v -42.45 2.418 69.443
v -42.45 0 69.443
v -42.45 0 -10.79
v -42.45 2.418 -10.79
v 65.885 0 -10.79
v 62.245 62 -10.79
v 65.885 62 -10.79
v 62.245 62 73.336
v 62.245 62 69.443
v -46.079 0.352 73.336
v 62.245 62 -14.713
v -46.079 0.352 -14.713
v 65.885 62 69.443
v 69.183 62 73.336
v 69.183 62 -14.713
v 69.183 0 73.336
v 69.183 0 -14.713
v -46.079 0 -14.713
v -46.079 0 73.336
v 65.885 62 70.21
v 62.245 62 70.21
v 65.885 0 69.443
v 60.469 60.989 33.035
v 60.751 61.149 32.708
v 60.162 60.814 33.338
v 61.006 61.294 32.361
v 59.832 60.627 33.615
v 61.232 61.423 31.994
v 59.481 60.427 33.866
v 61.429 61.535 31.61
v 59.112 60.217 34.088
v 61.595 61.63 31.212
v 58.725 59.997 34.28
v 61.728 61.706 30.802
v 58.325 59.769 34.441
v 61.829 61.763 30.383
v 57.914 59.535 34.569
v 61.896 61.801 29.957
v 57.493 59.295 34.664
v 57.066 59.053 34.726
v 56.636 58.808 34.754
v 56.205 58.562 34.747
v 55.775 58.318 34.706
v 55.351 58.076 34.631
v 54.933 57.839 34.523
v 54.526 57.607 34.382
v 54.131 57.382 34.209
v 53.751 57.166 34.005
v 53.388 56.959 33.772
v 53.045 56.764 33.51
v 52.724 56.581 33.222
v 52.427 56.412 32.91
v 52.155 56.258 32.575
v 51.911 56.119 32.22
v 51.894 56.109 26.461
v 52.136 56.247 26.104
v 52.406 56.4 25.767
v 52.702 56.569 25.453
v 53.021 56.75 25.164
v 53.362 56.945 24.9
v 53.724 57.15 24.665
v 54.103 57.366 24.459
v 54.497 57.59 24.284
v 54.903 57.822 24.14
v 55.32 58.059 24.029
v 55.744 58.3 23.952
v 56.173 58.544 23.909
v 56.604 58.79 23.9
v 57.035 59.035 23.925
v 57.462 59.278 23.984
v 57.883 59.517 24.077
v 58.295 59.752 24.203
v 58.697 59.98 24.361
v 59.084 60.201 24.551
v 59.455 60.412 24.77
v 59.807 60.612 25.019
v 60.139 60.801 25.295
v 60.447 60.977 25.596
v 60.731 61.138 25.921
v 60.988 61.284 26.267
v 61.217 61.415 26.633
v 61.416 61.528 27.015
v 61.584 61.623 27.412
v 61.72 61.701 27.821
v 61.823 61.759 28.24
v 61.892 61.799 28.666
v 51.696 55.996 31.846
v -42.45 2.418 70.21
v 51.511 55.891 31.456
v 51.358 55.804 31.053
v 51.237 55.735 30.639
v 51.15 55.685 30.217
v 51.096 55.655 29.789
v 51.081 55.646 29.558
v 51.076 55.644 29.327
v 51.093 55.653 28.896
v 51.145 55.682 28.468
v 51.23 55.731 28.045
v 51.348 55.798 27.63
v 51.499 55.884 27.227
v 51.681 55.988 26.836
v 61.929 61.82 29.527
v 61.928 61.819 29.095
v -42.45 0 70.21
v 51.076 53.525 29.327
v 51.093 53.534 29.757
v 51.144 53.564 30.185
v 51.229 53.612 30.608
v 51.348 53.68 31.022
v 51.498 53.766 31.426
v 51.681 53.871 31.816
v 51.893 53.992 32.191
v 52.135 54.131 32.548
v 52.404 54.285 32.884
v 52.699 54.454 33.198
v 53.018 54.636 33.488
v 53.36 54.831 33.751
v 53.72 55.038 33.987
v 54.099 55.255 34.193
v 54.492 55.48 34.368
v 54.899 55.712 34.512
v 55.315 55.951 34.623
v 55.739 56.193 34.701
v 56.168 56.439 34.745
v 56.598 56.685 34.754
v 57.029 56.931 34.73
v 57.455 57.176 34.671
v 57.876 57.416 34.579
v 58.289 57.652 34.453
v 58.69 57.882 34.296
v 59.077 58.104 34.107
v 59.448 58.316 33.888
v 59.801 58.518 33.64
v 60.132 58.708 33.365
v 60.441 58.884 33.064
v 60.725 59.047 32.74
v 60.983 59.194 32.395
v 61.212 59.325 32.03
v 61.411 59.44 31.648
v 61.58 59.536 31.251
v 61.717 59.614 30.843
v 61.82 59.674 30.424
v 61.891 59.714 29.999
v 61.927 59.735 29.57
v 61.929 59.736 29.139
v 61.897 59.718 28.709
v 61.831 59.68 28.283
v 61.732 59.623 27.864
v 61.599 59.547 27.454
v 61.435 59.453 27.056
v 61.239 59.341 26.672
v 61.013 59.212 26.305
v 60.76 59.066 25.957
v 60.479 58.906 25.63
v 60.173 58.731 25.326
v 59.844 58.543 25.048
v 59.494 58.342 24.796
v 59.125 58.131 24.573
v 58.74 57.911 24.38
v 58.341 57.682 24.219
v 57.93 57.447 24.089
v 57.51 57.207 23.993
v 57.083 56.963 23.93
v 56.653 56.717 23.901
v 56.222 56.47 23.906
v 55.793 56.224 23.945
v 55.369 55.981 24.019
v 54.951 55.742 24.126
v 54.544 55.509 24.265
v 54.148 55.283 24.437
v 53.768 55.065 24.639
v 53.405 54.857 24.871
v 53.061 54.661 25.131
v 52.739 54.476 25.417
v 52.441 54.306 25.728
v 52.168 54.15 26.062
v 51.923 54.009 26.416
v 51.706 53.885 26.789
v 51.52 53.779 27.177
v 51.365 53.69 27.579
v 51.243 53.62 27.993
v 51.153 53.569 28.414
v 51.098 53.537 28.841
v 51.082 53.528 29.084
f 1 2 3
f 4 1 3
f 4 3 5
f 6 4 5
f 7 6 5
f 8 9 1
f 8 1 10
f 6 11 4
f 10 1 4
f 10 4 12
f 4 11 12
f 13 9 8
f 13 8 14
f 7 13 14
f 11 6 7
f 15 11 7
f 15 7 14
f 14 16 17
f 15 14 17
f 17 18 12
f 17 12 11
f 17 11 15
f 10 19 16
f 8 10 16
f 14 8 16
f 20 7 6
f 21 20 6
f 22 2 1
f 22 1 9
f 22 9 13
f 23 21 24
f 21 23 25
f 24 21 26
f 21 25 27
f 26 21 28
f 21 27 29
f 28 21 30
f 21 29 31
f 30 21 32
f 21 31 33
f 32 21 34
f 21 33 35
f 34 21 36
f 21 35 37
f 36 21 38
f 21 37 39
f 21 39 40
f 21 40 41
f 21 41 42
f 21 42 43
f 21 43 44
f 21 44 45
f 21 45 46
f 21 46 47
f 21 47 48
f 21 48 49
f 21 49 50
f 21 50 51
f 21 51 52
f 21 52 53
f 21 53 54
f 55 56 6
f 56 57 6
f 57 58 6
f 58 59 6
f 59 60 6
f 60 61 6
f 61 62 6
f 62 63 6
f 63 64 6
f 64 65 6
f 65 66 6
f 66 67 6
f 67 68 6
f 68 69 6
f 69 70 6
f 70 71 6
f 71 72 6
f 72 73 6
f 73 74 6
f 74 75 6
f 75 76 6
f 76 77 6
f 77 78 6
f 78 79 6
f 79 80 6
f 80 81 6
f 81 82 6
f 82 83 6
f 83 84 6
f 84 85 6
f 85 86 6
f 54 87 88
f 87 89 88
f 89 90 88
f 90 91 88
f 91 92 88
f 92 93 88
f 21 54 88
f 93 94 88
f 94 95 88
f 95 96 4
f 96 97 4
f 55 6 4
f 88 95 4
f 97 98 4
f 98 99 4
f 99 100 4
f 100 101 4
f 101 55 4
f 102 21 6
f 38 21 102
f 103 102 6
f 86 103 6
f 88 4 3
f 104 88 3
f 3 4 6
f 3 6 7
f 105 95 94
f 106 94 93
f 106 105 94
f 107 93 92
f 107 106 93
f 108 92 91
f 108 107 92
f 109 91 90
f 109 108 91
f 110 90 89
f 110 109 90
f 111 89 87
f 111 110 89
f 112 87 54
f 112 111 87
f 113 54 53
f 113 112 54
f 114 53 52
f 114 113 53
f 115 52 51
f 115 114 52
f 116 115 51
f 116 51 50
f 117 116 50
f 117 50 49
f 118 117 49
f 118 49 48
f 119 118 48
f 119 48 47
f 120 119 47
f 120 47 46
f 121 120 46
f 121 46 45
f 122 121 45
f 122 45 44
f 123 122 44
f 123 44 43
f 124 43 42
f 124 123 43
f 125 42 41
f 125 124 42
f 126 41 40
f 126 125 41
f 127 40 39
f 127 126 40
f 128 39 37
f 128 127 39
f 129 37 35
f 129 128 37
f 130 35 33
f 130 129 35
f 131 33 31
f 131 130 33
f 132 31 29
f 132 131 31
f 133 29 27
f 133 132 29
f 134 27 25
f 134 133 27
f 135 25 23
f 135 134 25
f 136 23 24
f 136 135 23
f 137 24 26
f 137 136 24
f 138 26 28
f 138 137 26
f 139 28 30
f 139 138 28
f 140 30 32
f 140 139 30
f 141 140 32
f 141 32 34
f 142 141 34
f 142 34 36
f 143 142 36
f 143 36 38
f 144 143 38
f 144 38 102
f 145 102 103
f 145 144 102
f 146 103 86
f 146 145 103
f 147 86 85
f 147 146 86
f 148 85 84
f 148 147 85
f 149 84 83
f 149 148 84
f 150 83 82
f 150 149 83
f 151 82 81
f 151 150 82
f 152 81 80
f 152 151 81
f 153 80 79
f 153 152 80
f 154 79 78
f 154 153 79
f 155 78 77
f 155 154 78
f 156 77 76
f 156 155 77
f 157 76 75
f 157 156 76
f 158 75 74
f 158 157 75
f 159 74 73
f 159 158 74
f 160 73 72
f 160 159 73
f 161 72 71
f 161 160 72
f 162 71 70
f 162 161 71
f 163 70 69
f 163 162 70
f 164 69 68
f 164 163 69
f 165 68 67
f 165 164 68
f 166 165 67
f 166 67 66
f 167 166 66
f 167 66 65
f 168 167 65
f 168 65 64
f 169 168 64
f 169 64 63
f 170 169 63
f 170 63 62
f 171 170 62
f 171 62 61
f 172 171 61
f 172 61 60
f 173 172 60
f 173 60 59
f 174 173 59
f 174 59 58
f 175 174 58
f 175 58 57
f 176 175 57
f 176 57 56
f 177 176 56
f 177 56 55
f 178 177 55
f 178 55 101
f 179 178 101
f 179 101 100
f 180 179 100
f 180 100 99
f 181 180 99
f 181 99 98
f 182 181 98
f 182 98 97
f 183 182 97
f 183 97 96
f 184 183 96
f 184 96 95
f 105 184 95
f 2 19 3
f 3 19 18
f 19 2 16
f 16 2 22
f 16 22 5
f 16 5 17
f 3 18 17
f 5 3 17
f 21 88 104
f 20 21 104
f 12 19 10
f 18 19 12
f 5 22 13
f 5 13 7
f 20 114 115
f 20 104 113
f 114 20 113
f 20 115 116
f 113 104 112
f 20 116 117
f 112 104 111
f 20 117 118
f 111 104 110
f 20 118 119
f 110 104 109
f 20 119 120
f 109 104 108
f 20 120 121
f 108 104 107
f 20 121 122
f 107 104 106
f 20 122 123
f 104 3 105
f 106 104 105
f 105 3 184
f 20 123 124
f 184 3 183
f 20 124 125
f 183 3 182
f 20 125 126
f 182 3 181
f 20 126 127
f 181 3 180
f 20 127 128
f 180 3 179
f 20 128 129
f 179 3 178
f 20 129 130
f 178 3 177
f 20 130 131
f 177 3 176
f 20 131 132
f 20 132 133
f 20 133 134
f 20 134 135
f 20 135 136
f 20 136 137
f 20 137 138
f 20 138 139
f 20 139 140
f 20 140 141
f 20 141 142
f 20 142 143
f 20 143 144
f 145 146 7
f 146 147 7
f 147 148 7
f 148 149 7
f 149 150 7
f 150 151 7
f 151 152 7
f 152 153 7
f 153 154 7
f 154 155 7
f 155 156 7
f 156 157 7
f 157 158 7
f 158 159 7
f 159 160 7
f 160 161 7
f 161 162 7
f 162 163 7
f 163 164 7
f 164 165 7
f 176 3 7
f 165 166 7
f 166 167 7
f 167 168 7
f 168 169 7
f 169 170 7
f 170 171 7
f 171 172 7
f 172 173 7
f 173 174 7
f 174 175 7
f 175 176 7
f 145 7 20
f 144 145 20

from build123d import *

# Parameters (mm, degrees)
SKETCH1_W               = 115.26232874
SKETCH1_H               = 88.049326178
SKETCH1_W_2             = 108.334990875
SKETCH1_H_2             = 80.232993298
BOSS_EXTRUDE1_DEPTH     = 62
BOSS_EXTRUDE5_DEPTH     = 81
CUT_EXTRUDE1_DEPTH      = 140
CUT_EXTRUDE1_DEPTH_BACK = 140
SKETCH4_R               = 5.428235827
CUT_EXTRUDE2_DEPTH      = 143


with BuildPart() as part:
    # Sketch1 → Boss-Extrude1 (new body)
    with BuildSketch(Plane(origin=(0, 0, 0), x_dir=(1, 0, 0), z_dir=(0, 1, 0))):
        with Locations((11.551784024, -29.311600955)):
            Rectangle(SKETCH1_W, SKETCH1_H)
        with Locations((11.717857977, -29.326880603)):
            Rectangle(SKETCH1_W_2, SKETCH1_H_2, mode=Mode.SUBTRACT)
    extrude(amount=BOSS_EXTRUDE1_DEPTH)

    # Sketch3 → Cut-Extrude1 (cut, two sides: drawn at the far end of the back side and taken through both)
    with BuildSketch(Plane.XY.offset(-10.789616046).offset(-CUT_EXTRUDE1_DEPTH_BACK)):
        Polygon((62.245399556, 62), (-47.988966562, -0.734479554), (-64.593447551, 83.162099854), (74.178741731, 71.645214526), align=None)
    extrude(amount=CUT_EXTRUDE1_DEPTH + CUT_EXTRUDE1_DEPTH_BACK, mode=Mode.SUBTRACT)


with BuildPart() as body_2:
    # Sketch2 → Boss-Extrude5 (new body)
    with BuildSketch(Plane.XY.offset(-10.789616046)):
        Polygon((-42.44963746, 0), (65.885353415, 62), (62.245399556, 62), (-42.44963746, 2.417957753), align=None)
    extrude(amount=BOSS_EXTRUDE5_DEPTH)

    # Sketch4 → Cut-Extrude2 (cut)
    with BuildSketch(Plane(origin=(0, 0, 0), x_dir=(1, 0, 0), z_dir=(0, 1, 0))):
        with Locations(Location((56.50436197, -29.326880603, 0), (0, 0, 180))):
            Circle(SKETCH4_R)
    extrude(amount=CUT_EXTRUDE2_DEPTH, mode=Mode.SUBTRACT)


solid = Compound([part.part, body_2.part])
